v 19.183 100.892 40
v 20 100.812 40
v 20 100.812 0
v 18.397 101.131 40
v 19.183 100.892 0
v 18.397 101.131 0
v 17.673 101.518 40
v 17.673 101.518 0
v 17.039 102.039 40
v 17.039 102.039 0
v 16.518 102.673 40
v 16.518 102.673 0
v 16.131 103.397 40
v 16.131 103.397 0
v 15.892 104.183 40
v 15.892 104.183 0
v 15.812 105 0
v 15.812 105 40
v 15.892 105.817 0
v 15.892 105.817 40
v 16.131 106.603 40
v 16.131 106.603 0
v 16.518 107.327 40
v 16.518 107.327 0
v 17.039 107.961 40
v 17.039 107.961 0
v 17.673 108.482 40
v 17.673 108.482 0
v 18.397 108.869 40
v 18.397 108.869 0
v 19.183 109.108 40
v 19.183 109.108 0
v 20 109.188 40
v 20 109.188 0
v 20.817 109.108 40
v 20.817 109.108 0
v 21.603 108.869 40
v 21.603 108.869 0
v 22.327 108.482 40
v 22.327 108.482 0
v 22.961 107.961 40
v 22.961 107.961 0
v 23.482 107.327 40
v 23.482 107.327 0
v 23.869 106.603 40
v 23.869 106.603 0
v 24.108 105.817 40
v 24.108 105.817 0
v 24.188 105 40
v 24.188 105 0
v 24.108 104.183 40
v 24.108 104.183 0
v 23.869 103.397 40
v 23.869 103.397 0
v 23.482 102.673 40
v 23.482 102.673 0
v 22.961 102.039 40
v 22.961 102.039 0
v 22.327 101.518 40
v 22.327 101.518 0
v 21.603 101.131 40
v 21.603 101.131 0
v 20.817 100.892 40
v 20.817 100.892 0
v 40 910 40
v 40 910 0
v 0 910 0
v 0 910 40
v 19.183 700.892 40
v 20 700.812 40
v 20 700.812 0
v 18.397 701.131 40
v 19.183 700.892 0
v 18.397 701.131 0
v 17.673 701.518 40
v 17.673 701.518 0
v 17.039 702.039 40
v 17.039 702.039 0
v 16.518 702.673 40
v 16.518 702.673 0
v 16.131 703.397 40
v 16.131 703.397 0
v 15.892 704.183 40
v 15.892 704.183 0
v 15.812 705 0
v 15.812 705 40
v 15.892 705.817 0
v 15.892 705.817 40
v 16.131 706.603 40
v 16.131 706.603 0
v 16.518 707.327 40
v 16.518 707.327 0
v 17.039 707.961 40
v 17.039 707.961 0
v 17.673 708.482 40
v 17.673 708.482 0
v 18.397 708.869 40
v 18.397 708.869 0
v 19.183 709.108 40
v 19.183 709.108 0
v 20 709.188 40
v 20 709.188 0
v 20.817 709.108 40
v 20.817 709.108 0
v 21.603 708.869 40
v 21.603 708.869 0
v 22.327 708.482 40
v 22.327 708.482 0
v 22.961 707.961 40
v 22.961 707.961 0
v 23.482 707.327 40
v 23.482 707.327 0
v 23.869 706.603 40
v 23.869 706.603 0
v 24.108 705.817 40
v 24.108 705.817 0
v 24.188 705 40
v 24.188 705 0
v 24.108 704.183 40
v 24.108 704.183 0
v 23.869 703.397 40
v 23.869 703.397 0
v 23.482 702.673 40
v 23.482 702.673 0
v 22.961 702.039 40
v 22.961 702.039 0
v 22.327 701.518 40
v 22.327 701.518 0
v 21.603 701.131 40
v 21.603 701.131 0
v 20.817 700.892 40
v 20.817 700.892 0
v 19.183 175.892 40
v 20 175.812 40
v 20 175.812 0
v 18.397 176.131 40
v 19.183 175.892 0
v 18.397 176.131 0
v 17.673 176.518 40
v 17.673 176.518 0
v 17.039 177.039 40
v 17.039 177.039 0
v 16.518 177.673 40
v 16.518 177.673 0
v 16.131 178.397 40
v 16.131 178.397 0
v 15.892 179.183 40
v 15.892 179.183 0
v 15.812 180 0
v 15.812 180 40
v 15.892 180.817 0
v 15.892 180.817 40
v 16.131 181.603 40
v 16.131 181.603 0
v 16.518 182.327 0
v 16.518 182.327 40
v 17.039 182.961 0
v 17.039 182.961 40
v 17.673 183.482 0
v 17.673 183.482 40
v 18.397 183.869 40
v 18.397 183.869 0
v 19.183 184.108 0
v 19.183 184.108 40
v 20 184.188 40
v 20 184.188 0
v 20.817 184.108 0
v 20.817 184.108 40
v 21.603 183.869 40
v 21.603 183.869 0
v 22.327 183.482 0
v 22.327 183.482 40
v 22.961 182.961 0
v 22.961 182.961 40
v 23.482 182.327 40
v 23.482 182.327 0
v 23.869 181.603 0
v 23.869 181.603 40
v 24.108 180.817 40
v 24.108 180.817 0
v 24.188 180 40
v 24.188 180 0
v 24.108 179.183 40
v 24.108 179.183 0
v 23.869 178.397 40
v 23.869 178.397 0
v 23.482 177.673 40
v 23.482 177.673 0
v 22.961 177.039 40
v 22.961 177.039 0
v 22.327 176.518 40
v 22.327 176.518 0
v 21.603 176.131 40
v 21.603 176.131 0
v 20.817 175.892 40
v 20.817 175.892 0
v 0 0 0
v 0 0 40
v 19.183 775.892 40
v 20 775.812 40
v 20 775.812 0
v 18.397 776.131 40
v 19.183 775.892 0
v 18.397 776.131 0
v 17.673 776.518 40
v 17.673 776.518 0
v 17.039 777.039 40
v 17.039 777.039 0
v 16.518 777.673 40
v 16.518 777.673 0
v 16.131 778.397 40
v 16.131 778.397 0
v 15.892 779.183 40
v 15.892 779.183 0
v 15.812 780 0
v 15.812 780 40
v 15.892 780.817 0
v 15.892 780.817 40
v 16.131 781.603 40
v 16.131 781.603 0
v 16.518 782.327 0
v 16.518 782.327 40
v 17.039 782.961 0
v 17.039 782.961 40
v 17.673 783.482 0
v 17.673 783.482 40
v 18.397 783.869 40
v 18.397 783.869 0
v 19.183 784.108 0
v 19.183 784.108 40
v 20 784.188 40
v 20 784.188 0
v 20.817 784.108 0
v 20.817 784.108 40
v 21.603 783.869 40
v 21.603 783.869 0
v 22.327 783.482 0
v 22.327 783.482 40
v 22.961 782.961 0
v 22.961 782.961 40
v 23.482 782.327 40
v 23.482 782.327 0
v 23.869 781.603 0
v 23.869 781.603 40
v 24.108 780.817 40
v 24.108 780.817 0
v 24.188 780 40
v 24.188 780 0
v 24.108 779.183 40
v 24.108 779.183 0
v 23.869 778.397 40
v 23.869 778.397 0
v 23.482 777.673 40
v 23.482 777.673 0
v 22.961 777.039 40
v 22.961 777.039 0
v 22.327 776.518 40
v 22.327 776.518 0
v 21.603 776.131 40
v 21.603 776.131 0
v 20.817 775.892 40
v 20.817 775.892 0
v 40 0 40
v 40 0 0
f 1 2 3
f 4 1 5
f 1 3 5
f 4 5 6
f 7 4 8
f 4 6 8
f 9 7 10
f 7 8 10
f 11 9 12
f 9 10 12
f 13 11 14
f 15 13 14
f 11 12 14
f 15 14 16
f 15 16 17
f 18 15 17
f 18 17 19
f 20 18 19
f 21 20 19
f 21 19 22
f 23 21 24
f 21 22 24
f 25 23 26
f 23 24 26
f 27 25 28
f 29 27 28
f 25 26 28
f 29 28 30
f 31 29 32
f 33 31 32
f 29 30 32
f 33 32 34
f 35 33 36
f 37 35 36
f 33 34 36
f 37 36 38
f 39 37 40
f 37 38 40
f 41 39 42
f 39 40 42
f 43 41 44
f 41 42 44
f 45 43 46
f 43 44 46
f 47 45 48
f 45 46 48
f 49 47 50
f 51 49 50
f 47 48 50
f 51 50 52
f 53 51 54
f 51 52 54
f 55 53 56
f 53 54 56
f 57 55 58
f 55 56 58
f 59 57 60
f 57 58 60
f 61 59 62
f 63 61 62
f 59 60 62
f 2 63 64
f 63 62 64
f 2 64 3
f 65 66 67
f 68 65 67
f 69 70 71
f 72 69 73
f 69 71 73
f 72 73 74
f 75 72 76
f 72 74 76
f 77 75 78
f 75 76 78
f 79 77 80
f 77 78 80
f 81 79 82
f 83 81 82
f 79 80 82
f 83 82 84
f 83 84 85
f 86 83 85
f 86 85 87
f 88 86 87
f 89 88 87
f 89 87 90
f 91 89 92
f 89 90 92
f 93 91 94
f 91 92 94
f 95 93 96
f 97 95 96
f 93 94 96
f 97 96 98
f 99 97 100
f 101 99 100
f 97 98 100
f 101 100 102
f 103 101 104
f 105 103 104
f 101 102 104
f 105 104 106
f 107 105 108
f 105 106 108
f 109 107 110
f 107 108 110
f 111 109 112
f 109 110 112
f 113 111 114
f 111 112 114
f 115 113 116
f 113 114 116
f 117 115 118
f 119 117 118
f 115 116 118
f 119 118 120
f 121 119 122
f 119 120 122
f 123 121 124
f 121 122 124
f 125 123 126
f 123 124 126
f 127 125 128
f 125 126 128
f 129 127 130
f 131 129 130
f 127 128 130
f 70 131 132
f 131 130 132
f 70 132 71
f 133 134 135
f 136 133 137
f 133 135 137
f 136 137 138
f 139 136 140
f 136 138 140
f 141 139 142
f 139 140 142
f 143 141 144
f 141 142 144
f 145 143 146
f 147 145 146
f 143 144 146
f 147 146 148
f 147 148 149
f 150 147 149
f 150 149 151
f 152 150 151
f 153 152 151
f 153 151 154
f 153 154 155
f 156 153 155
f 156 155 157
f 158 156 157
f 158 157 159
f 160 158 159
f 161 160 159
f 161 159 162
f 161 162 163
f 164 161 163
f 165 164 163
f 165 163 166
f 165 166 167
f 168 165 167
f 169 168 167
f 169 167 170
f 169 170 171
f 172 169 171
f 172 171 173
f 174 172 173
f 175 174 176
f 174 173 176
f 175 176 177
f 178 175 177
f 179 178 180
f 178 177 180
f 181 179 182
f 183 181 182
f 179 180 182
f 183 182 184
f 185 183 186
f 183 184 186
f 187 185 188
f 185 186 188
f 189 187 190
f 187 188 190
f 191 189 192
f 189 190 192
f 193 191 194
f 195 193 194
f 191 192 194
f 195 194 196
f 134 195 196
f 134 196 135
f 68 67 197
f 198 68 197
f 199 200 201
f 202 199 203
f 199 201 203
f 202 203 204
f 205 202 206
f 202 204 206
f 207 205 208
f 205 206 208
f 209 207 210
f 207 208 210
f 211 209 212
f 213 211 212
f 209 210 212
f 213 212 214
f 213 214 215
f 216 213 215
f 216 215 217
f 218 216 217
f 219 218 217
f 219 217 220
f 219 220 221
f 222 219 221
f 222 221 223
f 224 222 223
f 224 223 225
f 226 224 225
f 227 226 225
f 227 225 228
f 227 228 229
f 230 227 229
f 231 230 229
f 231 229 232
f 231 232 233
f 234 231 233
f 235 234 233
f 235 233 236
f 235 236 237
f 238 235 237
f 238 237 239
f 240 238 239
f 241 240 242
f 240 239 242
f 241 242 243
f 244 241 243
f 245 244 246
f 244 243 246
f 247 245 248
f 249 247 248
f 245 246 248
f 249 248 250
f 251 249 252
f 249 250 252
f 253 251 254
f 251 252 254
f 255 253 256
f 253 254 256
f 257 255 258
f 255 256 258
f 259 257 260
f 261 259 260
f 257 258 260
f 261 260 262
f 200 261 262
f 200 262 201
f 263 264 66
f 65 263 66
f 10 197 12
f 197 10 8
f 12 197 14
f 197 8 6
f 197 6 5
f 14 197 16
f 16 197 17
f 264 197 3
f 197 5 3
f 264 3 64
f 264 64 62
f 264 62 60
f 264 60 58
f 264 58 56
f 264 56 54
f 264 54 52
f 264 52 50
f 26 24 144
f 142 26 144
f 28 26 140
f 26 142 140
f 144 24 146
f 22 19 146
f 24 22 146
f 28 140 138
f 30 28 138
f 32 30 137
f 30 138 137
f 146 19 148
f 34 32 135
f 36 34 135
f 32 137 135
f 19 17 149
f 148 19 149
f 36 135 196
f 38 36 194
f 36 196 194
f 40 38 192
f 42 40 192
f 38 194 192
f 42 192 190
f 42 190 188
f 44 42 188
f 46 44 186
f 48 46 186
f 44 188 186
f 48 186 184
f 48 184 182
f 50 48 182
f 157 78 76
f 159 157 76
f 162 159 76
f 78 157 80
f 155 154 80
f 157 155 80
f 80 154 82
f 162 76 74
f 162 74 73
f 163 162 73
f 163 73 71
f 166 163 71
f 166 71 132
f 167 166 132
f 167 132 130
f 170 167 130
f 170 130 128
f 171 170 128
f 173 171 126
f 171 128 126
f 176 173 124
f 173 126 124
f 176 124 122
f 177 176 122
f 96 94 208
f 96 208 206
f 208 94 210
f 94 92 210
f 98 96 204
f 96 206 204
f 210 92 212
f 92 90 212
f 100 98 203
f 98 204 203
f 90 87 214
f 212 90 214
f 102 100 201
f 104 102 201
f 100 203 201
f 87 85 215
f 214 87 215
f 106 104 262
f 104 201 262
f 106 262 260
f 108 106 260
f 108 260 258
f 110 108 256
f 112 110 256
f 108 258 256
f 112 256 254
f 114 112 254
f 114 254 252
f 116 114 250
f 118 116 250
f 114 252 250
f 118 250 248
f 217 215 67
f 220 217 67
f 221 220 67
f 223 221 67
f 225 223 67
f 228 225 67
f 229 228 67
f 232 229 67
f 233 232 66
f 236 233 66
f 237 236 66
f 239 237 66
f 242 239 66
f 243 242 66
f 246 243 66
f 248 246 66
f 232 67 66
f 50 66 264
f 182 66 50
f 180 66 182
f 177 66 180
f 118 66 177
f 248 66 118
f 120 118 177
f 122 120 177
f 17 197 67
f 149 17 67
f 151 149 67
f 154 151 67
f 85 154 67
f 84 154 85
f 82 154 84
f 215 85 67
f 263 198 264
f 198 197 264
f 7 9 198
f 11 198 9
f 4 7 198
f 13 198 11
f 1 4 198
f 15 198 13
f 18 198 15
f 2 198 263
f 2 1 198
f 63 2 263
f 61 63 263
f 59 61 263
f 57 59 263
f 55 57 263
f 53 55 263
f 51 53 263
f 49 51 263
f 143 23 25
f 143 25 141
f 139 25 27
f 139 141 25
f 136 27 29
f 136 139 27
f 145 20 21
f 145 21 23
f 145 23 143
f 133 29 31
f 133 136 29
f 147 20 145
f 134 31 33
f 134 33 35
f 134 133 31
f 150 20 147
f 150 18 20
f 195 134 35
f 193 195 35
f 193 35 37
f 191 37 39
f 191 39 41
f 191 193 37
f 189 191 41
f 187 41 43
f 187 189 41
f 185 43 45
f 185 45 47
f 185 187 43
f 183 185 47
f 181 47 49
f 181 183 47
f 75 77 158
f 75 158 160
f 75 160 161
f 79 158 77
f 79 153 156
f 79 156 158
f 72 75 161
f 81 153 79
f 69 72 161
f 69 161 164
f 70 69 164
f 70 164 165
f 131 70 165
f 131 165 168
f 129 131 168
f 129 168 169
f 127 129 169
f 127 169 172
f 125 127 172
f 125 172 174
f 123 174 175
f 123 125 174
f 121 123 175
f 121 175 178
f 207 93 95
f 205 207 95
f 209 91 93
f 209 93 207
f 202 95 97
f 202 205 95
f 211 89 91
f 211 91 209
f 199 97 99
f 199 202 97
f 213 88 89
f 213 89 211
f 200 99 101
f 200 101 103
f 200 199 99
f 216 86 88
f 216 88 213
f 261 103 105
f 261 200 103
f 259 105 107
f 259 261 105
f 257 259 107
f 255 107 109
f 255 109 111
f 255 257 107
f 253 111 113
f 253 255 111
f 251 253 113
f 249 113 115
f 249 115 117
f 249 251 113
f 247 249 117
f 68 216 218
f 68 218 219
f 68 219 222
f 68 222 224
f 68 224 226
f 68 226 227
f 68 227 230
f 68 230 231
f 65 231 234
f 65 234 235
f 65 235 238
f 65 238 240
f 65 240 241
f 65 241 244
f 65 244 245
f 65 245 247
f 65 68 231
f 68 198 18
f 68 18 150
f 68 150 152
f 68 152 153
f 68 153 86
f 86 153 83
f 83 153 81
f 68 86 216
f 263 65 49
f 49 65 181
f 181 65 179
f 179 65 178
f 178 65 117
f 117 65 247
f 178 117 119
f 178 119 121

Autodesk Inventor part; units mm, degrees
ref_plane "YZ Plane" through (0, 0, 0) normal (1, 0, 0) x (0, 1, 0)
ref_plane "XZ Plane" through (0, 0, 0) normal (0, 1, 0) x (-1, 0, 0)
ref_plane "XY Plane" through (0, 0, 0) normal (0, 0, 1) x (1, 0, 0)
sketch "Sketch1" plane through (0, 0, 0) normal (0, 0, 1) x (1, 0, 0)
  line L0 (0, 0) -> (40, 0)
  line L1 (40, 0) -> (40, 910)
  line L2 (40, 910) -> (0, 910)
  line L3 (0, 910) -> (0, 0)
  dimension "d0" = 40
  dimension "d1" = 910
extrude "Extrusion1" add sketch "Sketch1" along normal blind 40
sketch "Sketch2" plane through (0, 0, 40) normal (0, 0, 1) x (1, 0, 0)
  line L0 (40, 910) -> (0, 910) projected
  line L1 (0, 0) -> (40, 0) projected
  line L2 (0, 910) -> (0, 0) projected
  line L3 (40, 0) -> (40, 910) projected
  point P0 (20, 780)
  point P1 (20, 105)
  point P2 (20, 180)
  point P3 (20, 910)
  point P4 (20, 0)
  point P5 (20, 705)
  point P6 (20, 630)
  point P7 (20, 555)
  point P8 (20, 480)
  point P9 (20, 405)
  point P10 (20, 330)
  point P11 (20, 255)
  dimension "d4" = 130
  dimension "d5" = 105
  dimension "d6" = 20
  dimension "d7" = 40
  dimension "d8" = 20
  dimension "d9" = 75
  dimension "d10" = 20
  dimension "d11" = 75
  dimension "d12" = 20
  dimension "d13" = 75
  dimension "d14" = 20
  dimension "d15" = 75
  dimension "d16" = 20
  dimension "d17" = 75
  dimension "d18" = 20
  dimension "d19" = 75
  dimension "d20" = 20
  dimension "d21" = 75
  dimension "d22" = 20
  dimension "d23" = 75
  dimension "d24" = 20
  dimension "d25" = 75
hole "Hole1" at (20, 105, 40) at (20, 780, 40) at (20, 705, 40) at (20, 180, 40) direction (0, 0, -1) diameter 8.376 end through all thread size "M10x1.5" class "6H" standard "ISO Metric profile"
equation "\"d6\" = 0.5 * d7"
equation "\"d8\" = d6"
equation "\"d10\" = d8"
equation "\"d11\" = d9"
equation "\"d12\" = d6"
equation "\"d13\" = d9"
equation "\"d14\" = d10"
equation "\"d15\" = d13"
equation "\"d16\" = d14"
equation "\"d17\" = d15"
equation "\"d18\" = d16"
equation "\"d19\" = d17"
equation "\"d20\" = d18"
equation "\"d21\" = d19"
equation "\"d22\" = d20"
equation "\"d23\" = d21"
equation "\"d24\" = d22"
properties part number "Long side frame"
